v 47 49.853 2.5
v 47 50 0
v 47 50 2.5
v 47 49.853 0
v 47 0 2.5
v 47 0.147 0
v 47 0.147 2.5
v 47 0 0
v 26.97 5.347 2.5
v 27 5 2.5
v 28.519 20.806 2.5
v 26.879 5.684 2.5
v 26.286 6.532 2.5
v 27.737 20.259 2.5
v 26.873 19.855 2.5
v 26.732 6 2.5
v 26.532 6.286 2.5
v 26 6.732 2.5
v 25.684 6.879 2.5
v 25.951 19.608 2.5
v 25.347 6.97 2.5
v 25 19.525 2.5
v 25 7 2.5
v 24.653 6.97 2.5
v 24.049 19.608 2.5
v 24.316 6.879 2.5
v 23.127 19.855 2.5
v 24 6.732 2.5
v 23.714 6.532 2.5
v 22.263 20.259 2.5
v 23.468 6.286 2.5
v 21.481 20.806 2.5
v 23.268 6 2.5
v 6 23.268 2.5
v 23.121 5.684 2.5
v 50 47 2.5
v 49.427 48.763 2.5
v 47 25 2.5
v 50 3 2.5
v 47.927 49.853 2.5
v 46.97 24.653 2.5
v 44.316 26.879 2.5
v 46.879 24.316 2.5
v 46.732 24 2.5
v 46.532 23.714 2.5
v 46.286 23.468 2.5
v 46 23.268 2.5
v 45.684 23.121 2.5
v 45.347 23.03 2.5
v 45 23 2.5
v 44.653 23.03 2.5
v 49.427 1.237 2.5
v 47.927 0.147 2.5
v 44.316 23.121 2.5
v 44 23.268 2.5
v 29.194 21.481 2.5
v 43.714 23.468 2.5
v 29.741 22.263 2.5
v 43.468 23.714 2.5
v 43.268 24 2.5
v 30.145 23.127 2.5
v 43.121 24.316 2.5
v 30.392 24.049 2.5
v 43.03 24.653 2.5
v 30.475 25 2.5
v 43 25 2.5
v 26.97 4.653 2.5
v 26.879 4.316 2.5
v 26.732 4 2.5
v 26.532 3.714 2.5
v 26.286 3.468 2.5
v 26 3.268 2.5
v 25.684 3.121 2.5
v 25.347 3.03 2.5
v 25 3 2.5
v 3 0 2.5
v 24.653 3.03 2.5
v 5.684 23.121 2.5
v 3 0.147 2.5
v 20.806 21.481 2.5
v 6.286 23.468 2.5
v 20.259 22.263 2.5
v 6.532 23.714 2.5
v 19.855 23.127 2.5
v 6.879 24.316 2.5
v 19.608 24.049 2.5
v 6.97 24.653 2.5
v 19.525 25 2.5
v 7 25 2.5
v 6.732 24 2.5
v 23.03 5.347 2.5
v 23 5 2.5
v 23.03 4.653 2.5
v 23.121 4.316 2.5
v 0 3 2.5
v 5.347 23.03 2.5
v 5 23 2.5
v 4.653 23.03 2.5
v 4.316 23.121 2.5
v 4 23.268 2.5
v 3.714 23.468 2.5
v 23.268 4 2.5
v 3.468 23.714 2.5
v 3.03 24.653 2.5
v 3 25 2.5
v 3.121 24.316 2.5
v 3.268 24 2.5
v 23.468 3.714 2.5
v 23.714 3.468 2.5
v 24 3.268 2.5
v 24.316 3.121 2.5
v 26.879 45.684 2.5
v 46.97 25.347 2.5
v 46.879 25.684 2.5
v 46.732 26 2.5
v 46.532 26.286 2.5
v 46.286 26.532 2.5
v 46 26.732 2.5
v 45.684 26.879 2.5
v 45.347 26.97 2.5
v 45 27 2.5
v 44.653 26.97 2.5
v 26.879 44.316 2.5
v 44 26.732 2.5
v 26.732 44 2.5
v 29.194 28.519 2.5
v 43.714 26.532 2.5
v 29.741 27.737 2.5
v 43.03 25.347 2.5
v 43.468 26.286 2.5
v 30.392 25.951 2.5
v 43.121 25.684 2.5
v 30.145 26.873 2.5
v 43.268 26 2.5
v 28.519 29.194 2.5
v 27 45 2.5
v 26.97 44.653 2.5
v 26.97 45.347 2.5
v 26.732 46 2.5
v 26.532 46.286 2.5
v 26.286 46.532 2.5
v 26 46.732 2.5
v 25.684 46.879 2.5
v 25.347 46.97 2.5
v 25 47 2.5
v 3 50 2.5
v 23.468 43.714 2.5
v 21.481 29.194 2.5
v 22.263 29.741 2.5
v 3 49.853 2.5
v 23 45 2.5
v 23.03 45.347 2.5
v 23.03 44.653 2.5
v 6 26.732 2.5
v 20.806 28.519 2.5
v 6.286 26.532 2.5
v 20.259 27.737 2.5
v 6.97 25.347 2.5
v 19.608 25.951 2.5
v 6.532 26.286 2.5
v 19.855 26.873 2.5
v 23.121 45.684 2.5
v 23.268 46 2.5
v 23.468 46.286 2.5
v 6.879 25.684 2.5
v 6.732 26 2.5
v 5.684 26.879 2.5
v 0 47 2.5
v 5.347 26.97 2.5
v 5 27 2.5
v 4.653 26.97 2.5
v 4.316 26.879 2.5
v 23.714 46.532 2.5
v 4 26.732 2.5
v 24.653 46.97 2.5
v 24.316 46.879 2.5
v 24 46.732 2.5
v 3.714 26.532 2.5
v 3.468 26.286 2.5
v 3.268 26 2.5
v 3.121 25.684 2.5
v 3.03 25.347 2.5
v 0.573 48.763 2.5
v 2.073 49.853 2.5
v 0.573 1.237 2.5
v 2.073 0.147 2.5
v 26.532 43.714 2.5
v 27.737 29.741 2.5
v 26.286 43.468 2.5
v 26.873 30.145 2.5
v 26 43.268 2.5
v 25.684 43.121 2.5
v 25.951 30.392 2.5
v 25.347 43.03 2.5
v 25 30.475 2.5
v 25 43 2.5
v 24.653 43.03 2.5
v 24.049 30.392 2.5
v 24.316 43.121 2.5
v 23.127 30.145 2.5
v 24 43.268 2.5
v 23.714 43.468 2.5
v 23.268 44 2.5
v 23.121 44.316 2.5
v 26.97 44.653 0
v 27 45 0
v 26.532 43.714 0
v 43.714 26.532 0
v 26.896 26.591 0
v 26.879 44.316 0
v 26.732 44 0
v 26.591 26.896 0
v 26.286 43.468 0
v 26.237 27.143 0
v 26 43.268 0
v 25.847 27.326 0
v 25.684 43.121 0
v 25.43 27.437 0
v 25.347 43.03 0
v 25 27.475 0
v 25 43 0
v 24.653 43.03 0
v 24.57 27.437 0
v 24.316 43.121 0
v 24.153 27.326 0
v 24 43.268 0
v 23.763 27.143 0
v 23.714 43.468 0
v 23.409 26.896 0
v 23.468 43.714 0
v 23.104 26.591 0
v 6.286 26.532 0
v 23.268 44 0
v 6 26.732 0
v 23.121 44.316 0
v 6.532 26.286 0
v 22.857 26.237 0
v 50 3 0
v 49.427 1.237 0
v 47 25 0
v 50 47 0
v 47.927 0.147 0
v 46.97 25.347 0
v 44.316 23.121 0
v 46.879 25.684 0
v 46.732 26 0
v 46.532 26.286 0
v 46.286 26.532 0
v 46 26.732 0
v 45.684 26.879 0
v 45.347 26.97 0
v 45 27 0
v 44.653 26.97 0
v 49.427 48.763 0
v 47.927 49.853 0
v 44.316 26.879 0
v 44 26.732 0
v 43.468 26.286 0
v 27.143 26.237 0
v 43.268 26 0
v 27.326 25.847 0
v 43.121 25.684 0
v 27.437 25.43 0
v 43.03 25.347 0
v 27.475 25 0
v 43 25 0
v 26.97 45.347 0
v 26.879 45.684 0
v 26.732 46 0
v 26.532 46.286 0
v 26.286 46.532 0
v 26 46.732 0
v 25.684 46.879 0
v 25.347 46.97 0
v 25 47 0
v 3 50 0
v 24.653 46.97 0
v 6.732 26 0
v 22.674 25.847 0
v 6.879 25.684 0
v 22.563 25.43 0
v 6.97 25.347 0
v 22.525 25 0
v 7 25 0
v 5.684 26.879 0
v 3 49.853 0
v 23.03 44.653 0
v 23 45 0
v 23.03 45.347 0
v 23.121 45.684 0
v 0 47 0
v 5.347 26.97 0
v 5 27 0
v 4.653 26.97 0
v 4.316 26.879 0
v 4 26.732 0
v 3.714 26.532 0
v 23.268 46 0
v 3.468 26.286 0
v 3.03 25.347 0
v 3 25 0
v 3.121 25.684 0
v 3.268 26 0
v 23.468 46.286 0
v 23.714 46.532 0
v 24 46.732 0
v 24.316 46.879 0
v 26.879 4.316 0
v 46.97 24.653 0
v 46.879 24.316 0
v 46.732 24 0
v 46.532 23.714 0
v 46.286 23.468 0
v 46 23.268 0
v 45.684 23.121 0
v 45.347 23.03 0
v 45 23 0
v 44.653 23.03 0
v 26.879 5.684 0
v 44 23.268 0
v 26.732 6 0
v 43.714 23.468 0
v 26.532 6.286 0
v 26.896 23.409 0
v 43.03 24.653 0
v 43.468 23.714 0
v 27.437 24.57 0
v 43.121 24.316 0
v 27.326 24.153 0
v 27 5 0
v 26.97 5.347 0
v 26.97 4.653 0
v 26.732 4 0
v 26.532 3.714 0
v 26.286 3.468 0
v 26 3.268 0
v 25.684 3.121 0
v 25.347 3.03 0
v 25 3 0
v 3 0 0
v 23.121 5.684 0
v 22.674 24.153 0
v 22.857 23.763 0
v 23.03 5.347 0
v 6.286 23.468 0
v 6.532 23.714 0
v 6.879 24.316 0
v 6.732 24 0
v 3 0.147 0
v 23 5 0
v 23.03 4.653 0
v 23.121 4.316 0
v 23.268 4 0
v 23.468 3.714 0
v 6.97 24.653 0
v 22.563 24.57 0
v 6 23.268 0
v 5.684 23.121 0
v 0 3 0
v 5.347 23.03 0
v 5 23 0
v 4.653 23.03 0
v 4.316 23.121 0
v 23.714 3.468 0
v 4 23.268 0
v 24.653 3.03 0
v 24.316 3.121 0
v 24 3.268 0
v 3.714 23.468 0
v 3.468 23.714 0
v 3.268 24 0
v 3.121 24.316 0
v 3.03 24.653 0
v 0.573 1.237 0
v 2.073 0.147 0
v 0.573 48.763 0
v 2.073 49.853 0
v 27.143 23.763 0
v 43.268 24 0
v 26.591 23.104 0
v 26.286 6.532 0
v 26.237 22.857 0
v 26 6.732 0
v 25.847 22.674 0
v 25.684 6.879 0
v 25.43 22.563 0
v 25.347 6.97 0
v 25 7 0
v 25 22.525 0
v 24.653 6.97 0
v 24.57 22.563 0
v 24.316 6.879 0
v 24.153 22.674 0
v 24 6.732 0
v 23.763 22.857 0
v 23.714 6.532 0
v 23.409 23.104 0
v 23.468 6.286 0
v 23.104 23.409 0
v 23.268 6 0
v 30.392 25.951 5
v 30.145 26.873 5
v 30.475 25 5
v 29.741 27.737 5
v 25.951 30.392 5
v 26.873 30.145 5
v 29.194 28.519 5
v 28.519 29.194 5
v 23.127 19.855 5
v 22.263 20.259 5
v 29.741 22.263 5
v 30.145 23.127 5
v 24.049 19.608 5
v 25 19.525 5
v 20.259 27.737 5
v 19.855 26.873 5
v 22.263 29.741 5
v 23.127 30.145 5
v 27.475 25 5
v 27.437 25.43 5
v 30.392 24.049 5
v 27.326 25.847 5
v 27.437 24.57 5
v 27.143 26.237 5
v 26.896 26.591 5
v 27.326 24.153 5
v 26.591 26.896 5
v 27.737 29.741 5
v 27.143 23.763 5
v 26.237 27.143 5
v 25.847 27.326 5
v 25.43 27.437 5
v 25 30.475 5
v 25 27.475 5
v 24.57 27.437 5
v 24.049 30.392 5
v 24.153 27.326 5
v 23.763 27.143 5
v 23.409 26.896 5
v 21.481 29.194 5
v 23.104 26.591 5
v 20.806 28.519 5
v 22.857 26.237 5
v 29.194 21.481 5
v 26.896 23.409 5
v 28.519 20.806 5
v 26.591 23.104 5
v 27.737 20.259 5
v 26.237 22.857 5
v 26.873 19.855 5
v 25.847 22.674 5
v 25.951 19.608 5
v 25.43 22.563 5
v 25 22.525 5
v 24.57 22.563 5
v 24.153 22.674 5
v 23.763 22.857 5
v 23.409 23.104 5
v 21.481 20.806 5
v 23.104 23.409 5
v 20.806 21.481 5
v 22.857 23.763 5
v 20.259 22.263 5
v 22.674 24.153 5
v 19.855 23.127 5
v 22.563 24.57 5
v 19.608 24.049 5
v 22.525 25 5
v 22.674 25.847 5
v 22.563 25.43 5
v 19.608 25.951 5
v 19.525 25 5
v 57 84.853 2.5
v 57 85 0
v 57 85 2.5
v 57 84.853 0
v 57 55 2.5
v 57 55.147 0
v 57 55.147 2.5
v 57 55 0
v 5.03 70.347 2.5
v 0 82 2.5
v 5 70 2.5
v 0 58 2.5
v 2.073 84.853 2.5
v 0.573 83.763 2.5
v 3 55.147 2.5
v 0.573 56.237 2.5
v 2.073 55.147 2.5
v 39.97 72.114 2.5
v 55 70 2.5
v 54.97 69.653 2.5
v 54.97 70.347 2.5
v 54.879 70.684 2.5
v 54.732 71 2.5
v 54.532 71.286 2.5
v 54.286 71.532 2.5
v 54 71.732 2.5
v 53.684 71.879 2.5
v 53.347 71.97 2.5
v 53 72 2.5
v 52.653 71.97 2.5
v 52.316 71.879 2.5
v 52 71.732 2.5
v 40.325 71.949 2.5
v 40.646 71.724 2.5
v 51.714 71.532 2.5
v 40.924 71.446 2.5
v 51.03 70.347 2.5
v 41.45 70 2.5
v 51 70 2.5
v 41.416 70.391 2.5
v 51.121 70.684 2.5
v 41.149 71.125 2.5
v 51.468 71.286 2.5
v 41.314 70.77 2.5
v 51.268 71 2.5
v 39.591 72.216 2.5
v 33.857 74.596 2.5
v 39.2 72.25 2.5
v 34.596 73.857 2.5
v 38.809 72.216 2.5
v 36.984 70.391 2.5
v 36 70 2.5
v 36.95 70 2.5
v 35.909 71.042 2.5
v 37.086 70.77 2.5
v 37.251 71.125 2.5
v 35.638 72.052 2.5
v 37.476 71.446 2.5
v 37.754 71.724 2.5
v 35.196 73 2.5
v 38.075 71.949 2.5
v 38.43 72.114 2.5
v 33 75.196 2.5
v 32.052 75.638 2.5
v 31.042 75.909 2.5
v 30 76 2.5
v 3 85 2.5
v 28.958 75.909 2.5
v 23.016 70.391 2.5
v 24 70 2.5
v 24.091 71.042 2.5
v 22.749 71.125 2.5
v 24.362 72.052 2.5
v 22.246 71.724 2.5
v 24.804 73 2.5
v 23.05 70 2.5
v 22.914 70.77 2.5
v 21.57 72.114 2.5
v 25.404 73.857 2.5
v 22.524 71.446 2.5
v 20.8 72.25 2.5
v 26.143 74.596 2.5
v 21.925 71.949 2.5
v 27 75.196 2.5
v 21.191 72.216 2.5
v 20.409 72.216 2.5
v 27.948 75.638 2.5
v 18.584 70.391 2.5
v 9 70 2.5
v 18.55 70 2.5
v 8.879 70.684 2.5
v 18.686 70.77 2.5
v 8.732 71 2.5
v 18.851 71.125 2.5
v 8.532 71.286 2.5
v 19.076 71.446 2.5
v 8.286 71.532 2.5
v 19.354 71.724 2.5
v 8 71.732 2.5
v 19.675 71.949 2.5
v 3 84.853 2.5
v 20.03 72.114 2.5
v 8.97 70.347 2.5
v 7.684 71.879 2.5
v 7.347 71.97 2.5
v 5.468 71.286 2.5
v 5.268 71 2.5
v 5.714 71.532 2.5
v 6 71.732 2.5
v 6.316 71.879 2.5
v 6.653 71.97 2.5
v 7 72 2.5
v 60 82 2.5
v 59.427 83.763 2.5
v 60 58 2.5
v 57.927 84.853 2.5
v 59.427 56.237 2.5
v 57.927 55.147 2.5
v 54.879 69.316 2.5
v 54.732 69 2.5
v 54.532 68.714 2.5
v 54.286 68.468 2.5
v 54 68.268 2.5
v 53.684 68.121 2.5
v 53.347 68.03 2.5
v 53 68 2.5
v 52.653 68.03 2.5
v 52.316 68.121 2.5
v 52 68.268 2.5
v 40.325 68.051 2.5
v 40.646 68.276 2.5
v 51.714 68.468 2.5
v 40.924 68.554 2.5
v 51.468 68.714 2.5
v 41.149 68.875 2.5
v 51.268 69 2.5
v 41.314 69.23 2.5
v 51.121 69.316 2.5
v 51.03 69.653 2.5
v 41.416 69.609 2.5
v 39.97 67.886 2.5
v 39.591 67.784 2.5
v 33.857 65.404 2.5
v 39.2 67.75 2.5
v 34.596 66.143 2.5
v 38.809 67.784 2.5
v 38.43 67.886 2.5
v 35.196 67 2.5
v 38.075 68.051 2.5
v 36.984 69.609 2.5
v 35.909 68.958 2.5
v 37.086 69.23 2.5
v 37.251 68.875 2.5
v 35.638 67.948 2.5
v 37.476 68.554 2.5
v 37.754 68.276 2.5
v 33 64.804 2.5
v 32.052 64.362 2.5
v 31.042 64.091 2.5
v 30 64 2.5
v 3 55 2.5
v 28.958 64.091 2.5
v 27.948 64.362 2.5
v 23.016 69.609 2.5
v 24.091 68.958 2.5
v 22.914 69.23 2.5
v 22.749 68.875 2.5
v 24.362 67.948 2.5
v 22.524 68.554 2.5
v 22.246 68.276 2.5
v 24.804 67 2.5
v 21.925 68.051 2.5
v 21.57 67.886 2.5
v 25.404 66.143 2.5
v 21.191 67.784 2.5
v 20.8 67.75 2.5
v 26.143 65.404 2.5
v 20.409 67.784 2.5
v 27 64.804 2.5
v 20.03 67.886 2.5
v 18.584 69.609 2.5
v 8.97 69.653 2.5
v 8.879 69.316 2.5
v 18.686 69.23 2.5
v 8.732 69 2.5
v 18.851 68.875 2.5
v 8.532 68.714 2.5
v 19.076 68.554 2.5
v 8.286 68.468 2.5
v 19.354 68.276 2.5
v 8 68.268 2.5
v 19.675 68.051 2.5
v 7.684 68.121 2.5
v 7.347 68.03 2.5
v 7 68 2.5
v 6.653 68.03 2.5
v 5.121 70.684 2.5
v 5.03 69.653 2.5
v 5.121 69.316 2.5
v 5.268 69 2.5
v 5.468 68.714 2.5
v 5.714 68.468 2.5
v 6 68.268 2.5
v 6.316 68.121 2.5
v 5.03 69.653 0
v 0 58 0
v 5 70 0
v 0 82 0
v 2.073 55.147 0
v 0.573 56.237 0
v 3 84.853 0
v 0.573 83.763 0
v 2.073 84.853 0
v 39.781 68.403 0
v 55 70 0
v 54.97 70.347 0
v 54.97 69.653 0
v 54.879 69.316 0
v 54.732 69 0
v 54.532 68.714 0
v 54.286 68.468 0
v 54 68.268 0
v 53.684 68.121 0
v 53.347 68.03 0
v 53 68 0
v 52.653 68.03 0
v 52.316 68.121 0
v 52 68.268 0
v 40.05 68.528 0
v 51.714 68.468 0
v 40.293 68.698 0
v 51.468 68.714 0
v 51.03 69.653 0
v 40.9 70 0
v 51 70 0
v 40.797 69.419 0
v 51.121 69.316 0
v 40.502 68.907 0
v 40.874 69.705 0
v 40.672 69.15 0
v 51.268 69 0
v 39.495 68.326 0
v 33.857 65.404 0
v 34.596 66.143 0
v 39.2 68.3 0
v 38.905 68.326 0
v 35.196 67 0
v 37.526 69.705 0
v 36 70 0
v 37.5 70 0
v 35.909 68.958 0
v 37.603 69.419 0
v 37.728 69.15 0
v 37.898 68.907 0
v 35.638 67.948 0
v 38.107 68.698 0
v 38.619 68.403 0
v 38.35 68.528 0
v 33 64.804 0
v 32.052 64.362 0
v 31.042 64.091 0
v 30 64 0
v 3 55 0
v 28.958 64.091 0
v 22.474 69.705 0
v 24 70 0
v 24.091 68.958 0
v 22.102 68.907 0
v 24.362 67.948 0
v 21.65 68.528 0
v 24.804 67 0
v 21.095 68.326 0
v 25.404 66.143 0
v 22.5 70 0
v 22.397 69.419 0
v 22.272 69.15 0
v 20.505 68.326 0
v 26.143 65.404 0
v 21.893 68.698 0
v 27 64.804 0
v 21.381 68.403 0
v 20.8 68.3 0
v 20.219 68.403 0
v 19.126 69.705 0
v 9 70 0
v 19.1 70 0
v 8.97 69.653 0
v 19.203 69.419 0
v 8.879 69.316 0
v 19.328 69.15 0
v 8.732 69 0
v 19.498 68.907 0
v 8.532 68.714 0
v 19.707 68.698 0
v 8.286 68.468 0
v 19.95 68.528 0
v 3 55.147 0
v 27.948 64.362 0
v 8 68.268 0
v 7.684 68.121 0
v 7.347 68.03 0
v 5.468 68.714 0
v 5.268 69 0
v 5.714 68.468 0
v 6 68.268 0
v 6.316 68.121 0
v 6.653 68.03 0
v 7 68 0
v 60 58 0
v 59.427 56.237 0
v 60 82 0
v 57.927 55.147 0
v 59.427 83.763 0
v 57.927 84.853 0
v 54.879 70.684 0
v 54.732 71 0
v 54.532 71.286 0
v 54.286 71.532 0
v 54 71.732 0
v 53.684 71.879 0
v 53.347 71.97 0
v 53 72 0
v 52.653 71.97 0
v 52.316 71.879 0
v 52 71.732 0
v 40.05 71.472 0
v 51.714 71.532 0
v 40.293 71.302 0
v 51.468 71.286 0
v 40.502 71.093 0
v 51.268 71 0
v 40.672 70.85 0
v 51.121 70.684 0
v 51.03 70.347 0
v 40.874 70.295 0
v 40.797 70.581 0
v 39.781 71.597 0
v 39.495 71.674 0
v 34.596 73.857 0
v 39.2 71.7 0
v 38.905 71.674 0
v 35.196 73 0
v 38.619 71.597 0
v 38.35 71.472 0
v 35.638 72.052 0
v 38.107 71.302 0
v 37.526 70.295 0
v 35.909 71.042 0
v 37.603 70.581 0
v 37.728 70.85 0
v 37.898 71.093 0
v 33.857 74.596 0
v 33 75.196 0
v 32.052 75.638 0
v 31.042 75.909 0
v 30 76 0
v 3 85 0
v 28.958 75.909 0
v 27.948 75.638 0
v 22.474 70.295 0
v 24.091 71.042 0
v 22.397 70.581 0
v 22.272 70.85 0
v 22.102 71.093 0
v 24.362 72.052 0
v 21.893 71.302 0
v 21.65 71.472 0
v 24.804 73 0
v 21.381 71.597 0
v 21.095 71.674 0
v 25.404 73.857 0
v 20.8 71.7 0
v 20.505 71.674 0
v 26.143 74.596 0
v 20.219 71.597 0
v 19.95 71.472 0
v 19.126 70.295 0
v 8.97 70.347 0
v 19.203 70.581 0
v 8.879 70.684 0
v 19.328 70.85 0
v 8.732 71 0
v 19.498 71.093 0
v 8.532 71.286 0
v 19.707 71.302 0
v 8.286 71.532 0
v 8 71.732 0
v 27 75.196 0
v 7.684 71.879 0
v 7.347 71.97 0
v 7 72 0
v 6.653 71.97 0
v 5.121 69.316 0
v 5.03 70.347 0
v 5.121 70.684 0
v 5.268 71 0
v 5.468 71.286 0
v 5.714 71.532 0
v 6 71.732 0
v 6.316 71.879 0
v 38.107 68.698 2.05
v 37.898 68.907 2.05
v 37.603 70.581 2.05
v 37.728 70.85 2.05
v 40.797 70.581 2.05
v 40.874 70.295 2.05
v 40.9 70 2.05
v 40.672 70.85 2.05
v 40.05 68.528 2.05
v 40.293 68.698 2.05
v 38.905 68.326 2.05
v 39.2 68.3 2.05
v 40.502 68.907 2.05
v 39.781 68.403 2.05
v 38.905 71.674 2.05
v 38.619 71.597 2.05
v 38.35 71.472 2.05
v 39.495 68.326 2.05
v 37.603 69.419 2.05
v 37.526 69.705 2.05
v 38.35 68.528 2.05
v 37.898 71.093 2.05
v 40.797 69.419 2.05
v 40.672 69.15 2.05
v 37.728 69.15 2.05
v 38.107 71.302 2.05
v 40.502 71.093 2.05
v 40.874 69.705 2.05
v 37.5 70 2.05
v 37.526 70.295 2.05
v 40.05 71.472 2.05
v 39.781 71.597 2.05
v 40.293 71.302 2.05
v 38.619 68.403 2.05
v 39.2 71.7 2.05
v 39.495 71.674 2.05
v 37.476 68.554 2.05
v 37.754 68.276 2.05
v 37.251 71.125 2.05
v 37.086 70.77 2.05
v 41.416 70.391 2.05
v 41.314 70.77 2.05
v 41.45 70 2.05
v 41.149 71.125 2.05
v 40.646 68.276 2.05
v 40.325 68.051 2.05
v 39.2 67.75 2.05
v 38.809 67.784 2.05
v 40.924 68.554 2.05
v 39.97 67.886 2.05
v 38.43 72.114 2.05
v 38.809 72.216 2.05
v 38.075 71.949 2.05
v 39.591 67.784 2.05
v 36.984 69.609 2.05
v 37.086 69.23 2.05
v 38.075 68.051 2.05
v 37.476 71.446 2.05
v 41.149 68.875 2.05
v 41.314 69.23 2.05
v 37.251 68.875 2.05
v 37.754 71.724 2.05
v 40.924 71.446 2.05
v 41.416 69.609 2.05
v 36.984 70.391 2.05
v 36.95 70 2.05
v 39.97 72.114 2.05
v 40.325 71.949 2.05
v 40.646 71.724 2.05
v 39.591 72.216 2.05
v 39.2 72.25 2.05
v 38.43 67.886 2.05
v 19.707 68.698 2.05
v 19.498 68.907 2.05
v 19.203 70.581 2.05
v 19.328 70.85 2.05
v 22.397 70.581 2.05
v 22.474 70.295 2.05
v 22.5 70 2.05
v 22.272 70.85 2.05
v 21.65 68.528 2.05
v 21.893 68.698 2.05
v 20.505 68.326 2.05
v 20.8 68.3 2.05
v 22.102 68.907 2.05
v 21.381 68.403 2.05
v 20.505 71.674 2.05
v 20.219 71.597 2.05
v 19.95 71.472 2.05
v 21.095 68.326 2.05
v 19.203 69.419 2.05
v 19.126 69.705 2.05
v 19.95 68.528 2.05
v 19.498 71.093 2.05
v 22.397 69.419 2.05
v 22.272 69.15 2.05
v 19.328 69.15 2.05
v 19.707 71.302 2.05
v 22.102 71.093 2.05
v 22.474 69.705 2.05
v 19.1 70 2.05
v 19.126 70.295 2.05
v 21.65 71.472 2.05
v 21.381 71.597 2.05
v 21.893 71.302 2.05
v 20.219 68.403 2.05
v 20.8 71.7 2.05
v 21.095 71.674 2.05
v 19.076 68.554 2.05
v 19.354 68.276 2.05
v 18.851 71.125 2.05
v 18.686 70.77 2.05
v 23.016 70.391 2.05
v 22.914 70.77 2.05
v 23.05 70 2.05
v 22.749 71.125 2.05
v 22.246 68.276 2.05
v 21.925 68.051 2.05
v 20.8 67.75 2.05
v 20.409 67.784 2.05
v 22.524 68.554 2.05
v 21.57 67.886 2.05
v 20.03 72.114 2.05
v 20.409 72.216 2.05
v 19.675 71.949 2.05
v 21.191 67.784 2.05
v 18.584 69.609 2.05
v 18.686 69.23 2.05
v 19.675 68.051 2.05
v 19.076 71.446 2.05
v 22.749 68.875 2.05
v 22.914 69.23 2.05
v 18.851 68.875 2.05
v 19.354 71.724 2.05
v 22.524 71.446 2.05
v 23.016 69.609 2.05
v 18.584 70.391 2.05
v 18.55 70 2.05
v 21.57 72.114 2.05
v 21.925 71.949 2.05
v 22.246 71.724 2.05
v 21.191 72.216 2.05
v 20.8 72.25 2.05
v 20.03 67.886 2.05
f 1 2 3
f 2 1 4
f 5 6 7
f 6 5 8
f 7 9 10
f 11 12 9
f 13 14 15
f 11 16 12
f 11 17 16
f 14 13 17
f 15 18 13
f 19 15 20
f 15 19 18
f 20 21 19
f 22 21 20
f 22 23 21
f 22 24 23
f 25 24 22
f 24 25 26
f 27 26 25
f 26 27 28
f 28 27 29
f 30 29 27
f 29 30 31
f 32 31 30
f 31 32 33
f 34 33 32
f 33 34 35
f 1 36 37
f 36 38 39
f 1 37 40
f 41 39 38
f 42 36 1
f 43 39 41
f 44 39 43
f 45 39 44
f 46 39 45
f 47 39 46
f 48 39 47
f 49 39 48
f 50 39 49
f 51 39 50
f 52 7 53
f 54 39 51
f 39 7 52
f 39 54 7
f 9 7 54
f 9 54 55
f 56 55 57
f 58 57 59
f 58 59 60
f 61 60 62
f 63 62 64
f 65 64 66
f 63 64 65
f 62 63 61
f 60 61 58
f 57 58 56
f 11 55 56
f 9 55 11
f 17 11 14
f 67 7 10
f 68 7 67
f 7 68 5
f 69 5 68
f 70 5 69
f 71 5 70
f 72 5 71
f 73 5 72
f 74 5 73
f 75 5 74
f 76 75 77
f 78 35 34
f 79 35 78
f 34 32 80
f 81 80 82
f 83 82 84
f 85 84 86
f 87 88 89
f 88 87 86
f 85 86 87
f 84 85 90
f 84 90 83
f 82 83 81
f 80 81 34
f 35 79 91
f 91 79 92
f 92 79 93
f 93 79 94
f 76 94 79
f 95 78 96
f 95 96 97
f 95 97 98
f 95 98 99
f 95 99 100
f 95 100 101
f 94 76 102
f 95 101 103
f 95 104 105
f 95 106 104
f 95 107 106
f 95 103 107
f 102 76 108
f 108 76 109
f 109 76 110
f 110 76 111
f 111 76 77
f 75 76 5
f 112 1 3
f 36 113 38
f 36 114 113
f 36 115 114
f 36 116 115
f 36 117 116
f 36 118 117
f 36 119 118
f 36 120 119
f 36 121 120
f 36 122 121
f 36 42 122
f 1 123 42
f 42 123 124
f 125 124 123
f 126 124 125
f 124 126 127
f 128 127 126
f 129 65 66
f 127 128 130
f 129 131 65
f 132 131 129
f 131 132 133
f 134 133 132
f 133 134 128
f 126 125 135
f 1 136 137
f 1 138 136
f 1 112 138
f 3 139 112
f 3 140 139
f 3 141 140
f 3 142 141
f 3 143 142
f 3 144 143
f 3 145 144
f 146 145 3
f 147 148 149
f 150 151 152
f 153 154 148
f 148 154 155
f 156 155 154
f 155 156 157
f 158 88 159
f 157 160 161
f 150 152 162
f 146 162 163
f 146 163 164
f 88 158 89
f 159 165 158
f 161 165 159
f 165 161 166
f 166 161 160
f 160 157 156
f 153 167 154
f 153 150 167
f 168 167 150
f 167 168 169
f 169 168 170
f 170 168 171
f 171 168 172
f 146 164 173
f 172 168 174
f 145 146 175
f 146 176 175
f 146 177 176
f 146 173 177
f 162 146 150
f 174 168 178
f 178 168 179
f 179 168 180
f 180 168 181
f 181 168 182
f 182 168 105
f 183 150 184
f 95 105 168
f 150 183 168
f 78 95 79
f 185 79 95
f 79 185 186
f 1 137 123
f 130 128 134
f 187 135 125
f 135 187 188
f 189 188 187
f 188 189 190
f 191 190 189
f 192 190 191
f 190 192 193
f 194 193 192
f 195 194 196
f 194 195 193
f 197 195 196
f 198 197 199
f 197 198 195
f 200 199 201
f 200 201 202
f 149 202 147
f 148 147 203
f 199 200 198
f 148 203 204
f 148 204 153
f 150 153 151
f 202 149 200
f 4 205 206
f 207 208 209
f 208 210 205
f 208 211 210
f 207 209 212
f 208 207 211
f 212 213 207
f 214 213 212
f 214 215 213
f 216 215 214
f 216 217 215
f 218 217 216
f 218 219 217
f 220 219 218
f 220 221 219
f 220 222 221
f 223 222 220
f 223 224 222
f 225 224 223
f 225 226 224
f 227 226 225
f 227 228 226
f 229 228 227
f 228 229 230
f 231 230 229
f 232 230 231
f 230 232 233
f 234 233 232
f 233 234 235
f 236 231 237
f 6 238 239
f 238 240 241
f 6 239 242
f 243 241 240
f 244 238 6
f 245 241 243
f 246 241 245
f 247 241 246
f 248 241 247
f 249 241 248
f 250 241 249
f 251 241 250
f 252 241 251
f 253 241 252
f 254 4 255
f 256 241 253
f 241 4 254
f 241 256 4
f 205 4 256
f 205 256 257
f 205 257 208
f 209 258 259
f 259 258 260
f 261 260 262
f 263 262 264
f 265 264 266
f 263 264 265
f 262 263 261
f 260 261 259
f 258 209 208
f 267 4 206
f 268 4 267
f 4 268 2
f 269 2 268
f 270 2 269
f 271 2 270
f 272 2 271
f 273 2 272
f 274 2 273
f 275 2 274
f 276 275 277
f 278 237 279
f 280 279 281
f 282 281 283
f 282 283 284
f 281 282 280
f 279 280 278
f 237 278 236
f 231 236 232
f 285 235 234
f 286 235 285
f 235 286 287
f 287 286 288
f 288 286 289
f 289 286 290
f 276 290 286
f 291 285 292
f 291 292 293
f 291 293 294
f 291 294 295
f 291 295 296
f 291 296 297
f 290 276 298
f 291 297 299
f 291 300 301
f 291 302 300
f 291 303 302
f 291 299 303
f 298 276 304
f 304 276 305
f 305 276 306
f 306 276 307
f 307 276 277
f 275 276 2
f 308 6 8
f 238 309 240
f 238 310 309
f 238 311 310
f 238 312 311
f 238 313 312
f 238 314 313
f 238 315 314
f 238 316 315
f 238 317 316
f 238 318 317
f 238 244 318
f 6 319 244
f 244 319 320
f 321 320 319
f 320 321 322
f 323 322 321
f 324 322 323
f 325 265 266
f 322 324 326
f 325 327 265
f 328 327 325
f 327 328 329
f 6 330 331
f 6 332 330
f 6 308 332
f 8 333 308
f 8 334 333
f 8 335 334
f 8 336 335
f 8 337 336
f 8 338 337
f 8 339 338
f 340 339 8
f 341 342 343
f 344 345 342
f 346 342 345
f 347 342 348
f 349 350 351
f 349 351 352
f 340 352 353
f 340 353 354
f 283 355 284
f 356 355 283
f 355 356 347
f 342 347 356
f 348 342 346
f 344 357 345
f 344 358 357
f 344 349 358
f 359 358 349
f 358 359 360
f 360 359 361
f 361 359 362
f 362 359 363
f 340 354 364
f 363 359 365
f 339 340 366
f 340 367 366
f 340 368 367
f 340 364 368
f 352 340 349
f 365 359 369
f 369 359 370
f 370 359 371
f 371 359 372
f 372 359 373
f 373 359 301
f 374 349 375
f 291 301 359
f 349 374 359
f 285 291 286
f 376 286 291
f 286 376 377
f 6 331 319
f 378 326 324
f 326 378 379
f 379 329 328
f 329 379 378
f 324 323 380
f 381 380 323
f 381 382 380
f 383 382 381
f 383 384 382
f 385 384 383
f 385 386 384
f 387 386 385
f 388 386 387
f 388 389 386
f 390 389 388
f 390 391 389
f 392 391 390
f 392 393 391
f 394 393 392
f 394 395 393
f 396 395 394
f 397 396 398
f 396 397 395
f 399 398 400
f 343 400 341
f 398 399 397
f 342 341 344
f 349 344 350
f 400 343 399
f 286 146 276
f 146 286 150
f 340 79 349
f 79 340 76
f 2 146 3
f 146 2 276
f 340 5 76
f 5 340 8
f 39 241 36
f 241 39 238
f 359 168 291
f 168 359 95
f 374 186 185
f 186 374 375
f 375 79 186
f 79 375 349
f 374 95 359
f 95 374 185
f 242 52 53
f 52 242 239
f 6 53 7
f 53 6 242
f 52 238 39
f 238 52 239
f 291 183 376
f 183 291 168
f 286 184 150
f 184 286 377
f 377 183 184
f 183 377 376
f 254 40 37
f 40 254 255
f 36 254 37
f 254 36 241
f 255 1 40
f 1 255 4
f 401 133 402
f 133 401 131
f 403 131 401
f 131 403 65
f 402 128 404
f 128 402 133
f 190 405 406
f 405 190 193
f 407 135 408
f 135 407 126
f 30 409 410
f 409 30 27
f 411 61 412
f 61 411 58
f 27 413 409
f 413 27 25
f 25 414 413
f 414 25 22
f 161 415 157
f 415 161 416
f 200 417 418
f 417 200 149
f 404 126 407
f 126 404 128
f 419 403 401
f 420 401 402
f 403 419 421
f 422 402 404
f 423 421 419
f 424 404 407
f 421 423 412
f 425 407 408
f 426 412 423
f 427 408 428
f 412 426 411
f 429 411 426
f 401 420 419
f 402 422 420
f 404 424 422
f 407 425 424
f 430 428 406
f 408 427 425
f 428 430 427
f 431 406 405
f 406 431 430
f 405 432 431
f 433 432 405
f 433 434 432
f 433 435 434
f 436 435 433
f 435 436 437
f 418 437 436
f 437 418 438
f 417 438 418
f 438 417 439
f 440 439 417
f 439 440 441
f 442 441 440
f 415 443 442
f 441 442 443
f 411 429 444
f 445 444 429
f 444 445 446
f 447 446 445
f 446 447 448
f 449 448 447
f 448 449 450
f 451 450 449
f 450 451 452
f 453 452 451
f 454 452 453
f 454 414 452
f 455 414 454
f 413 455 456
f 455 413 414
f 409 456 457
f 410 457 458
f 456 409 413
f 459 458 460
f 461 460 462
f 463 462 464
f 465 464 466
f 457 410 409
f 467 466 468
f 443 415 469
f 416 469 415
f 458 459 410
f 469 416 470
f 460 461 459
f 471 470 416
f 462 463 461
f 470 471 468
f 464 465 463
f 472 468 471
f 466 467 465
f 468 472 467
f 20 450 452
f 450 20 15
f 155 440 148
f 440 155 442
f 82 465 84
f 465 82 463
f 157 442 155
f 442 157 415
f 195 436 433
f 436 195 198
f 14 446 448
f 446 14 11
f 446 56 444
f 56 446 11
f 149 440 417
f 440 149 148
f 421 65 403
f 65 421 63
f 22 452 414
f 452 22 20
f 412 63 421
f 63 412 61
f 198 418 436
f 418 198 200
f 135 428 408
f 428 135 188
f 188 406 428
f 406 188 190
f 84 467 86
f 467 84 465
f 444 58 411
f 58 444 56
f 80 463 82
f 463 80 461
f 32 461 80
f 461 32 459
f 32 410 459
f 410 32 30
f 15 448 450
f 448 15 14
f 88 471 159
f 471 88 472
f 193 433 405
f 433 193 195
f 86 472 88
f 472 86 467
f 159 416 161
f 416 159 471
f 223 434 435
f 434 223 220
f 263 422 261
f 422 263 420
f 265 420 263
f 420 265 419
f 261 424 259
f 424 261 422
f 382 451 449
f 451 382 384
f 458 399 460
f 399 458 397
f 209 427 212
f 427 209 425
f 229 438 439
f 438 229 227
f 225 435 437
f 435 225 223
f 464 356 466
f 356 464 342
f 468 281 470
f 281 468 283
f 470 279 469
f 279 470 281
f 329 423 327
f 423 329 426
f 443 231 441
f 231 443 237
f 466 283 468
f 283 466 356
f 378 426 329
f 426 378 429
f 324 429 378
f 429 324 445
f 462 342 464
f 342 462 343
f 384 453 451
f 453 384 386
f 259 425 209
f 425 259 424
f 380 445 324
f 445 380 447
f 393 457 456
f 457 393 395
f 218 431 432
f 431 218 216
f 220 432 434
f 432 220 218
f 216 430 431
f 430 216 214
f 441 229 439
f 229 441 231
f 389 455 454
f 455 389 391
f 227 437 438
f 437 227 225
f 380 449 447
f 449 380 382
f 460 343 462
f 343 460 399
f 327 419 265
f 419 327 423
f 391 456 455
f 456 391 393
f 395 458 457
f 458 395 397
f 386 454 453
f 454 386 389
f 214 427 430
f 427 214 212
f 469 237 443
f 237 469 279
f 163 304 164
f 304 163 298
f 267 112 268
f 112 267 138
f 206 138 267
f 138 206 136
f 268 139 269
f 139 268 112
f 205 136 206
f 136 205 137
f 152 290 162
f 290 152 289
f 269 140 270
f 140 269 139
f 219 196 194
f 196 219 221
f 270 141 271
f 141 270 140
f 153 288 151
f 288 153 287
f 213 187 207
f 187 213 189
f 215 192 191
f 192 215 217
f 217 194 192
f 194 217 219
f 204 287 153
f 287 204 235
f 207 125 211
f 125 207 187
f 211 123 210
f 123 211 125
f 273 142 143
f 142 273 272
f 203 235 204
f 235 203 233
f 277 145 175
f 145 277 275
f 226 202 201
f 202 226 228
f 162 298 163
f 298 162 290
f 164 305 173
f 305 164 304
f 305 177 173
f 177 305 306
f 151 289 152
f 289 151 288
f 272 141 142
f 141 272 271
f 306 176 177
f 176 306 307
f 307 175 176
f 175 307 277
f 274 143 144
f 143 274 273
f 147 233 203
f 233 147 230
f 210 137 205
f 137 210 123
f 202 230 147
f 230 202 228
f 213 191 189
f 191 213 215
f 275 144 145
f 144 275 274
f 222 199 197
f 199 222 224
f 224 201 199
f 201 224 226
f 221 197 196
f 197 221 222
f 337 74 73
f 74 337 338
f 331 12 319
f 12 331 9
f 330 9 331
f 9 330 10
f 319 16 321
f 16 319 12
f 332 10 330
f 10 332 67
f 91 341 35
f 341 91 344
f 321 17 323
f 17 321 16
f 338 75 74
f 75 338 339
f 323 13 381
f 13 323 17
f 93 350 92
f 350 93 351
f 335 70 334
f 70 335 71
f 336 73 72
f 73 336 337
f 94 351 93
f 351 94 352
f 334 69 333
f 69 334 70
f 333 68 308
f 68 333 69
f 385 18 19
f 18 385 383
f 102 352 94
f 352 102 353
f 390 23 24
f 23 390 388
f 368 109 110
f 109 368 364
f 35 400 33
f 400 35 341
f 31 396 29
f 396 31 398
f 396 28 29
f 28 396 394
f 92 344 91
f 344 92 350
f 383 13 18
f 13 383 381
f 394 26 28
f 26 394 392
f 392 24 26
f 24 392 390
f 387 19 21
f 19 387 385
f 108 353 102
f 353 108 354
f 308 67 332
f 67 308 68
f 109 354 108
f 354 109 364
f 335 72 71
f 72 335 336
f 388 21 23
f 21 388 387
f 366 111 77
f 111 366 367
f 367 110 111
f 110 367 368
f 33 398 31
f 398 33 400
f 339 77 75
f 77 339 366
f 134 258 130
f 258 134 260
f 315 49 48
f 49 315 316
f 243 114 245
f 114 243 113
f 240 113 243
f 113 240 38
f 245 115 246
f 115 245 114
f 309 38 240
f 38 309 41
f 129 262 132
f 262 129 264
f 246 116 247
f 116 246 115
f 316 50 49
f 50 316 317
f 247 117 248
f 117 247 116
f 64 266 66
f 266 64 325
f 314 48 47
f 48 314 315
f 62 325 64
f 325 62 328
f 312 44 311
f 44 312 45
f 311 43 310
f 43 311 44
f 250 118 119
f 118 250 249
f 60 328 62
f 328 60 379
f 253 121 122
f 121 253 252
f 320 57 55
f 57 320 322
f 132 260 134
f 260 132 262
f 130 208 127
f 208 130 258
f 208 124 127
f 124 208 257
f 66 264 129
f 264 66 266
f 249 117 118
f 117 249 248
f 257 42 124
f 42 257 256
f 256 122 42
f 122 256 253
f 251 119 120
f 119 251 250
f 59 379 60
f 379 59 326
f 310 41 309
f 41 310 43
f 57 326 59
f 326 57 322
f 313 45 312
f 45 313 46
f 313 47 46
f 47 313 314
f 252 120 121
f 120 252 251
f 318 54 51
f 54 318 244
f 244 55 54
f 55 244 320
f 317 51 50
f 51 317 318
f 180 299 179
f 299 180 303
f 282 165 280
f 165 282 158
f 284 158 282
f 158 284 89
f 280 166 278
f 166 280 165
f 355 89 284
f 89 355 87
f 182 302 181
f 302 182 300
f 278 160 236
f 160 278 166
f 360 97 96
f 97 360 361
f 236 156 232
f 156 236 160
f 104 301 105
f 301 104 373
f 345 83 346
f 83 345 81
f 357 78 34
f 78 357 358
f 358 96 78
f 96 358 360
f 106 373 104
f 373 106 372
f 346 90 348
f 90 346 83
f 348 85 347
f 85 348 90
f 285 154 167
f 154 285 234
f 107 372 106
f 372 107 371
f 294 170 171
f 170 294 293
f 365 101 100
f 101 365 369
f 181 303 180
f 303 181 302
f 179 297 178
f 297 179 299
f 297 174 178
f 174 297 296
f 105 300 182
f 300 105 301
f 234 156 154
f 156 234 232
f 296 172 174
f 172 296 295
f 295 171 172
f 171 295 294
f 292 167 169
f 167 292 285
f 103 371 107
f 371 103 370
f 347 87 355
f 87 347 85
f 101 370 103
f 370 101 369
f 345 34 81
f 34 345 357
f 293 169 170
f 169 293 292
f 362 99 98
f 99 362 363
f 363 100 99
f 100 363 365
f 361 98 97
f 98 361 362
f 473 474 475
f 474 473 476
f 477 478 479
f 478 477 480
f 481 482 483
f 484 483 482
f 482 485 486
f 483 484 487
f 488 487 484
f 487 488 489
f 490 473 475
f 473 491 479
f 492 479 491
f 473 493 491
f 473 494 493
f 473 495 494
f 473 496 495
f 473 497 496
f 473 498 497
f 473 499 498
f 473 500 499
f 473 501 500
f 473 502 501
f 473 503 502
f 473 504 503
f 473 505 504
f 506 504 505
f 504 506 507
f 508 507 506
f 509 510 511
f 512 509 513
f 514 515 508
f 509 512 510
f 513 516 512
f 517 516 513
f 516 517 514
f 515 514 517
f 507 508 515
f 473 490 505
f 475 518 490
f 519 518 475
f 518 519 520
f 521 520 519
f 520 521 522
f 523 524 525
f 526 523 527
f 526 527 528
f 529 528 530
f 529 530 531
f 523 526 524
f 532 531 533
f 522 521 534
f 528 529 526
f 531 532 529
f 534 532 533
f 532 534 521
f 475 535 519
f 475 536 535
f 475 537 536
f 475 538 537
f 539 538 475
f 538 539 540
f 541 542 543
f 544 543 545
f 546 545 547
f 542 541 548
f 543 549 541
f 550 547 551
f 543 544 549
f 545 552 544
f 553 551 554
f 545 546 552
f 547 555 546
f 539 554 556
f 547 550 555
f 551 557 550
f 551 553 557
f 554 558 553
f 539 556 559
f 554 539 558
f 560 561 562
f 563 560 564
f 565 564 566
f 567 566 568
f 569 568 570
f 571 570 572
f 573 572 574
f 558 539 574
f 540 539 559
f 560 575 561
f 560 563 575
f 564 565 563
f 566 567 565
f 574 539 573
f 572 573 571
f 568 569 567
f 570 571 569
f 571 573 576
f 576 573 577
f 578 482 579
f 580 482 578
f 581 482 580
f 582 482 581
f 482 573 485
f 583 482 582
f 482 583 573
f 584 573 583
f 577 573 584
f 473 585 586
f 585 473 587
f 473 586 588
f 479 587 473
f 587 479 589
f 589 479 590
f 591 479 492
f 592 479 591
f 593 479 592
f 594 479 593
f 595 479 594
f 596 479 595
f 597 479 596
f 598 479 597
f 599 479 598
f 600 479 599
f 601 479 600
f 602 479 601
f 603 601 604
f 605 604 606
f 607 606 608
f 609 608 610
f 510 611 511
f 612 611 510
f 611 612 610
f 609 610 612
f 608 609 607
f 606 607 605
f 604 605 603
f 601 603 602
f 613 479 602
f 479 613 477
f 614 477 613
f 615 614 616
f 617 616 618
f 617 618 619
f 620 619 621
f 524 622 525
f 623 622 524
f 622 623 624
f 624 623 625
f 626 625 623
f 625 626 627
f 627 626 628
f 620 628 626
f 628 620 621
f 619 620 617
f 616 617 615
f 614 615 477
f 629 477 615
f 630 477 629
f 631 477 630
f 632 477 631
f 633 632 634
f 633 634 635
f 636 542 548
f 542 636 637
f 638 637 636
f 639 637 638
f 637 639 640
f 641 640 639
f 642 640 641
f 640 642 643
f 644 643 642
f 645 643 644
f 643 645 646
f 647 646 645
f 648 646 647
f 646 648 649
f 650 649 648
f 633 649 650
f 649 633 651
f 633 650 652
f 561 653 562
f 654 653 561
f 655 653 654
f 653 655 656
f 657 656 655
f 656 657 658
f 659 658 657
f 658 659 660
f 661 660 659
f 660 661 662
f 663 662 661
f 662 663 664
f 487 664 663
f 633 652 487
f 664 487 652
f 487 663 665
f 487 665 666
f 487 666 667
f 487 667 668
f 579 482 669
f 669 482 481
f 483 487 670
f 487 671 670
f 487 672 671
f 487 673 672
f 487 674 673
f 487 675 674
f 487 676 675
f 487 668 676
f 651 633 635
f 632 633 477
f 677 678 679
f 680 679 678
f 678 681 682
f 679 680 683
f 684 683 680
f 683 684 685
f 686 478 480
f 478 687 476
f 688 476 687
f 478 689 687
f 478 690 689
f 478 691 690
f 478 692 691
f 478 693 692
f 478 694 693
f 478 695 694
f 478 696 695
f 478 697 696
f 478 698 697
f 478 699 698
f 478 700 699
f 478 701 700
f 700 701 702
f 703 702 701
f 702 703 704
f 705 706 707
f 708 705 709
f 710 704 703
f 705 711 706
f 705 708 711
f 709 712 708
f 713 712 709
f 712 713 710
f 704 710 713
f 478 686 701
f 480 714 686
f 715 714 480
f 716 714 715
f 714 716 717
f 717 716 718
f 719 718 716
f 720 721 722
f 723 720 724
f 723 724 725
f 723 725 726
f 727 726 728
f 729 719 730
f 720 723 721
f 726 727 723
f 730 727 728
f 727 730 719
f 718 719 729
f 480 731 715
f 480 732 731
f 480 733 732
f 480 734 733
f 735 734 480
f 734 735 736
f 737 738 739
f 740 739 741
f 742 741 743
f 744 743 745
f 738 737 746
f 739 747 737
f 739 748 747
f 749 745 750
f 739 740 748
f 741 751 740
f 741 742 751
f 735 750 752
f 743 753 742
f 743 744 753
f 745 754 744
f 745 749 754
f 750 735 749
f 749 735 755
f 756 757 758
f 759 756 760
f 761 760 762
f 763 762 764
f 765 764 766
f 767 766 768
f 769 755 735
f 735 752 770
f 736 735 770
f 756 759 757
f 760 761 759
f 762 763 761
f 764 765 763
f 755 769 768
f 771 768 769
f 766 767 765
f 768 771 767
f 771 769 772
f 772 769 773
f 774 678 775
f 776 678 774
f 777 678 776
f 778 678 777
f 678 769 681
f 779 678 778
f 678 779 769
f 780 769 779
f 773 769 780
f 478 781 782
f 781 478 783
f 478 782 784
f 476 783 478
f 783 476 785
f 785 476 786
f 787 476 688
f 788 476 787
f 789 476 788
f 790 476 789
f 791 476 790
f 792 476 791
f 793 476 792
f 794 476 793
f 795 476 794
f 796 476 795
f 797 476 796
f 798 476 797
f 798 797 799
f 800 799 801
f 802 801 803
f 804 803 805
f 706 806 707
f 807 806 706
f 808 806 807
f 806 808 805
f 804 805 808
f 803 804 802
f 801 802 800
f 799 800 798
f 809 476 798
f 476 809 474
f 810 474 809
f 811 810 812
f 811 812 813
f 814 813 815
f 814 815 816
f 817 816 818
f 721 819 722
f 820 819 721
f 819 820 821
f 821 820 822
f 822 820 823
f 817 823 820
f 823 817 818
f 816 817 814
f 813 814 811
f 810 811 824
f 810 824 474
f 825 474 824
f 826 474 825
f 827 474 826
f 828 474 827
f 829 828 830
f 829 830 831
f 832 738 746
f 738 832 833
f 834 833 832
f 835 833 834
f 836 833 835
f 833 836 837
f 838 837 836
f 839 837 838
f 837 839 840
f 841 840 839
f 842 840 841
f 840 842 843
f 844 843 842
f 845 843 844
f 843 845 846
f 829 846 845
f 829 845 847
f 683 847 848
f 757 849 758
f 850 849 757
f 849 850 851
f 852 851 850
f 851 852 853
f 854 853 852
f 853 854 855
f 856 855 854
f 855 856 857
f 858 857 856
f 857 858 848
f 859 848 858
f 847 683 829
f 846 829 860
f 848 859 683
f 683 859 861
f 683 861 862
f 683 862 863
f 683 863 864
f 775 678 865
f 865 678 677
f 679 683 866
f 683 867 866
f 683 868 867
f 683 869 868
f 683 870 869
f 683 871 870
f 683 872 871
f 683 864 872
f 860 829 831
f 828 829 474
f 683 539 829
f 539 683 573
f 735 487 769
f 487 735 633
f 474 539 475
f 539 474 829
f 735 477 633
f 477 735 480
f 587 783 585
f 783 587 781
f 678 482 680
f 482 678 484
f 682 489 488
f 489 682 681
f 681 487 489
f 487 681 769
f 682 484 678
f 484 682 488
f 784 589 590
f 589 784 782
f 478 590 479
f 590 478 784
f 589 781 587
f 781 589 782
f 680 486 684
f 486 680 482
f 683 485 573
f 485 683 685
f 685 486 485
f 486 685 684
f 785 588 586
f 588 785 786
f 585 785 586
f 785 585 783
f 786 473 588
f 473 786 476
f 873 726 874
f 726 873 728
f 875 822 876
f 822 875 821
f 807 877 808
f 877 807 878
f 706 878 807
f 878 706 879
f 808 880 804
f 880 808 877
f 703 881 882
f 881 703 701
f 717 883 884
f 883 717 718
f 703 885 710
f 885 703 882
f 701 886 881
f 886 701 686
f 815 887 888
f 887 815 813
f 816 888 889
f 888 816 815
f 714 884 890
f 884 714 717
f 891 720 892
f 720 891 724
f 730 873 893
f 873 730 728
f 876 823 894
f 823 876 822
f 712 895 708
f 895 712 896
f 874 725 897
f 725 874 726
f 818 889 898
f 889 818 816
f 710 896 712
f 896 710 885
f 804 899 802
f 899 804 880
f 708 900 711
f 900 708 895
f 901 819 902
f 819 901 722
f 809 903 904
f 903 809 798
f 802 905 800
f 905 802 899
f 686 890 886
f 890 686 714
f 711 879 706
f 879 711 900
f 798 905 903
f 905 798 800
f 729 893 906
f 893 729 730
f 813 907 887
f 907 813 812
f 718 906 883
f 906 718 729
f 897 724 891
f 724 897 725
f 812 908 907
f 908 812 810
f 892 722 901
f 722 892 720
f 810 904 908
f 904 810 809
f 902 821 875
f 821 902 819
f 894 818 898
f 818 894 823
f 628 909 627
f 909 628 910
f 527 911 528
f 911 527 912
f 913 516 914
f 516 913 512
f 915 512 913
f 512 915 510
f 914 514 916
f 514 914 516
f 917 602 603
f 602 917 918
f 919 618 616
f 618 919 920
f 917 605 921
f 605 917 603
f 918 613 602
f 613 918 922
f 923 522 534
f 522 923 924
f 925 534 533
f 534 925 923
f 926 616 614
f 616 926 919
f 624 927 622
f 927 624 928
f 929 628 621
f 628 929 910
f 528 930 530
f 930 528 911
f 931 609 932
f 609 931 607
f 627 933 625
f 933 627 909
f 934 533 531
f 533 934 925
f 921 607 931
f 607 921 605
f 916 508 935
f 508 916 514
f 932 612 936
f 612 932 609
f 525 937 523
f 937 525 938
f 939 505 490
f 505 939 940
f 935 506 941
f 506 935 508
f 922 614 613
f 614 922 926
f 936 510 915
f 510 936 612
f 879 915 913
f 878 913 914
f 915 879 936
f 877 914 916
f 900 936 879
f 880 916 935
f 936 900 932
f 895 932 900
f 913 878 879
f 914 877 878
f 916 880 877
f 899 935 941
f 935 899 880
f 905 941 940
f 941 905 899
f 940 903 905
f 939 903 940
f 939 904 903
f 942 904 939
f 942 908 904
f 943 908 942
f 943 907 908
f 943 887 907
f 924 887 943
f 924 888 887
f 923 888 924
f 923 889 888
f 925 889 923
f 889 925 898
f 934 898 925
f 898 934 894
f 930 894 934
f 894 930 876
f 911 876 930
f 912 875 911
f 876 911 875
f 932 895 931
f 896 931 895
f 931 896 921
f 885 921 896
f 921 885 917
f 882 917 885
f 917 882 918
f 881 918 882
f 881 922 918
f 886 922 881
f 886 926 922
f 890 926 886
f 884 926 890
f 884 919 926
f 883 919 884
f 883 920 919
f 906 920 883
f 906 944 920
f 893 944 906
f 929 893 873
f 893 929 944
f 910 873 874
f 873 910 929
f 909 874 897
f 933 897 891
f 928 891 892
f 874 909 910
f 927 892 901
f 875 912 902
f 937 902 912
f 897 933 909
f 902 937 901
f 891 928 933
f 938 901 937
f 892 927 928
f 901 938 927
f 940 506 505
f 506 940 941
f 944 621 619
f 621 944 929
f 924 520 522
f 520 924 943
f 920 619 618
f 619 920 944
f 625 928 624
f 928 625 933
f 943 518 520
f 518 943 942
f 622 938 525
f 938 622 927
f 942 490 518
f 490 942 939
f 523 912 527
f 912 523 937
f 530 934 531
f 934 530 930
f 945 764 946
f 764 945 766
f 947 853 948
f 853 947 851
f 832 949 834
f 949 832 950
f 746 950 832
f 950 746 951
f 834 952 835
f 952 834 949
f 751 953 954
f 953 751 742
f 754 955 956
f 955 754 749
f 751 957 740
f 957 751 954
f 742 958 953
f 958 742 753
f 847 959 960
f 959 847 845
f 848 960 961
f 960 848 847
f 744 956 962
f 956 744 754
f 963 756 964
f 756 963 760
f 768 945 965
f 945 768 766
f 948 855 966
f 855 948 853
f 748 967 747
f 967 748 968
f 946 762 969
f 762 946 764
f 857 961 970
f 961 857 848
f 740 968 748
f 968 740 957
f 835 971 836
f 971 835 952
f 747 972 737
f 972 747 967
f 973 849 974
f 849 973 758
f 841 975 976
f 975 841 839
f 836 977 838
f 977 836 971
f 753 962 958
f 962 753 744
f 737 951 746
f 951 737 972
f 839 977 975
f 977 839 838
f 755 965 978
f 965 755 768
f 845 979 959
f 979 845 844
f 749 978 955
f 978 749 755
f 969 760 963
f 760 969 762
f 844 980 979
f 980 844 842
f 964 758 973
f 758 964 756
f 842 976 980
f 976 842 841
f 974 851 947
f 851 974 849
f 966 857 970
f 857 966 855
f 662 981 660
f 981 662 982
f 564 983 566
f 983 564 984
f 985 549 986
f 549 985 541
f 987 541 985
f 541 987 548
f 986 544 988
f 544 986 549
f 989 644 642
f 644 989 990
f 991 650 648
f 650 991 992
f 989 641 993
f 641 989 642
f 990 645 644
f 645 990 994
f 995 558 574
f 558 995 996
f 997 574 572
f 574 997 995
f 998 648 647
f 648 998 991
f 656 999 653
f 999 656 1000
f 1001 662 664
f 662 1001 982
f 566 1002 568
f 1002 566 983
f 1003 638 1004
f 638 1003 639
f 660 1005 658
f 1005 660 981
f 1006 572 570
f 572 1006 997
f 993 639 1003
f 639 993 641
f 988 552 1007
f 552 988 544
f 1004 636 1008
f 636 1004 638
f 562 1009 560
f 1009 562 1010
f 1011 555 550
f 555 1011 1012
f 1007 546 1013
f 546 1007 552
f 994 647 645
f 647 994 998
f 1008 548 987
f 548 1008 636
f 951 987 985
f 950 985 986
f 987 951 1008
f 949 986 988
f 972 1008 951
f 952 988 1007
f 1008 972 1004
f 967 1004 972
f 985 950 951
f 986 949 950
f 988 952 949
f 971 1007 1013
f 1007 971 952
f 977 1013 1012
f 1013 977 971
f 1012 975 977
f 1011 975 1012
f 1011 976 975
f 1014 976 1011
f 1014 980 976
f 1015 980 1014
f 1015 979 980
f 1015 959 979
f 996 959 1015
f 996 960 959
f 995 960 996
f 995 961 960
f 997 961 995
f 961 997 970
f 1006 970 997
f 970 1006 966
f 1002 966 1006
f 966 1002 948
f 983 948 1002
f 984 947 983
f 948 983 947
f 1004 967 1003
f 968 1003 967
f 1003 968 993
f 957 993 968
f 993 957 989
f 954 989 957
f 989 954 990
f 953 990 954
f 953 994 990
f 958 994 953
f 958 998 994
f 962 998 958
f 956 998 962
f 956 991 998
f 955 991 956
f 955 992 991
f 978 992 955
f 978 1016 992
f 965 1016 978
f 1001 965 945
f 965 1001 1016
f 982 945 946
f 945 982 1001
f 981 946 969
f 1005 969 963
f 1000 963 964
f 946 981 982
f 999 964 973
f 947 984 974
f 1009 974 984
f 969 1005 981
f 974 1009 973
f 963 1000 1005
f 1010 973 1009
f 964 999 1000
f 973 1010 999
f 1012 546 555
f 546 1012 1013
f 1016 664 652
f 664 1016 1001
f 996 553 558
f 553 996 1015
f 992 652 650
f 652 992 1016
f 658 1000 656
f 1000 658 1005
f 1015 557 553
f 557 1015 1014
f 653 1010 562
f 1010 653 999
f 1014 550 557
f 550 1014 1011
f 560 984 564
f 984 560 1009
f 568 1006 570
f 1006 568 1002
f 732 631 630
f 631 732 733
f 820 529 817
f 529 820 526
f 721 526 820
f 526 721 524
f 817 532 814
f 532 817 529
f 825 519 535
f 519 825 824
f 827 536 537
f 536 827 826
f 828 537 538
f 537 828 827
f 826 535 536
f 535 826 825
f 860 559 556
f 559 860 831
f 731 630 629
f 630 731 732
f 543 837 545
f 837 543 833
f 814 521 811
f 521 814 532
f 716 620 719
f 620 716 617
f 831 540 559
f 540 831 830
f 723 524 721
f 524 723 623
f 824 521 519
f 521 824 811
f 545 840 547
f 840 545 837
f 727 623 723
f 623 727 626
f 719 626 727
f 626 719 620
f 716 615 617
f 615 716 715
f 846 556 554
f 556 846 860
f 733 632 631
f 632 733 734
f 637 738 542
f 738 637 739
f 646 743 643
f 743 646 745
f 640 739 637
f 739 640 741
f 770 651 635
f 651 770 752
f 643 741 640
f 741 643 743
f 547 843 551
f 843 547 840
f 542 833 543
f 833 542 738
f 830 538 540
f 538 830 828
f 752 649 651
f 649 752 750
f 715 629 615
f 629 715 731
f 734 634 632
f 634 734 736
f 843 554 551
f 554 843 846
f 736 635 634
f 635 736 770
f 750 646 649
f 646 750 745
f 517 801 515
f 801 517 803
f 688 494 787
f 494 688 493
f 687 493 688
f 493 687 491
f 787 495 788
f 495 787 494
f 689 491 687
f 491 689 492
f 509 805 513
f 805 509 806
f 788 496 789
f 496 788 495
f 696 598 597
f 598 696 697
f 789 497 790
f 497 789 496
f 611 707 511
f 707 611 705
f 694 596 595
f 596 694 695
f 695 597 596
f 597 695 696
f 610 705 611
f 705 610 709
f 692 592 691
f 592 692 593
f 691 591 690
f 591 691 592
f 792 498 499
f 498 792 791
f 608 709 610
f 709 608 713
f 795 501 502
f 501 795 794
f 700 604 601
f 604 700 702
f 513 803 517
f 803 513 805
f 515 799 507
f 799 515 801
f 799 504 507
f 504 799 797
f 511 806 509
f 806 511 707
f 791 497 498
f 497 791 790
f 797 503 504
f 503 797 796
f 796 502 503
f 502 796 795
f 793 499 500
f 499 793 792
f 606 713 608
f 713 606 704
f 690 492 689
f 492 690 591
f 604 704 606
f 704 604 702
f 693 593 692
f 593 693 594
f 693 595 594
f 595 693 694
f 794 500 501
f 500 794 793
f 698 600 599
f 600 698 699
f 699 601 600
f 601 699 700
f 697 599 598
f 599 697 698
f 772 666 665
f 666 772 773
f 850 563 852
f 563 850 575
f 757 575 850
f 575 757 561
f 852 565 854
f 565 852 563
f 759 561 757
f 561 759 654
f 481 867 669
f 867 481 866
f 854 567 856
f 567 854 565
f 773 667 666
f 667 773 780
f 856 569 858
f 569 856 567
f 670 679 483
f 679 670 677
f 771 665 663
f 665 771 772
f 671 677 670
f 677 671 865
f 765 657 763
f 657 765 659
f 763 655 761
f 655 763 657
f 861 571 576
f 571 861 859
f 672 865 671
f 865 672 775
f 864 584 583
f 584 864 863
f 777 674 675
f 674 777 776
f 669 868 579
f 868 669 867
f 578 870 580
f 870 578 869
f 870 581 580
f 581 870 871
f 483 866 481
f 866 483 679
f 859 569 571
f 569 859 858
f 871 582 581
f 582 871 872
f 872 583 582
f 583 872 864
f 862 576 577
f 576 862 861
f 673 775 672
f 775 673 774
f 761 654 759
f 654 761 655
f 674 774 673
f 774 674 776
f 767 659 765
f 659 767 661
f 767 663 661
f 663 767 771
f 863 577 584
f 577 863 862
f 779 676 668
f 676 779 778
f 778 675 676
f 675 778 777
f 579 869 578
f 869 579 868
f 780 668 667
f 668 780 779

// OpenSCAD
// Customizable Rotable Bowden Extruder 
// preview[view:south, tilt:top];

// Which one would you like to see?
part = "both"; // [top:Motor Base,bottom:Bearing Base,both:Motor and Bearing Base]



/* [Motor Base] */

//Motor base width 
motor_base_size_x = 60;

//Motor base length 
motor_base_size_y = 30;

//Motor base height 
motor_base_size_z = 2.5;

//
bearing_top_central_hole_diameter =  12;

//
bearing_top_screw_head_diameter = 4.5;

//
bearing_top_screw_hole_diameter = 3.4;

//
bearing_top_screw_height = 4.5;

//distant between bearing top screw hole and the central
bearing_top_screw_hole_position = 9.2;

//motor width
motor_width = 42;

//
motor_holder_diameter = 4;


/* [Bearing Base] */

//Hard Disk bearing base width (mm)
bearing_base_size_x = 50;

//Hard Disk bearing base length 
bearing_base_size_y = 50;

//Hard Disk bearing base height 
bearing_base_size_z = 2.5;

//Central hole diameter    
base_central_hole_diameter = 4.95;

//Base screw diameter 
base_screw_diameter = 4;

//The distant between the screw and the central
base_screw_position = 20;



/* [Hidden] */
bearing_top_screw_head_hole_height = motor_base_size_z -bearing_top_screw_height/2;



module rounded(size, r) {
    //2 cube + 4 cylinder
    union() {
        translate([r, 0, 0]) cube([size[0]-2*r, size[1], size[2]]);
        translate([0, r, 0]) cube([size[0], size[1]-2*r, size[2]]);
        translate([r, r, 0]) cylinder(h=size[2], r=r);
        translate([size[0]-r, r, 0]) cylinder(h=size[2], r=r);
        translate([r, size[1]-r, 0]) cylinder(h=size[2], r=r);
        translate([size[0]-r, size[1]-r, 0]) cylinder(h=size[2], r=r);
    }
}

//bearing base
module bearingBase() {
    difference() {
        union() {
            //bearing base
            rounded([bearing_base_size_x, bearing_base_size_y, bearing_base_size_z], 3);
            //bearing central
            translate ([bearing_base_size_x/2,bearing_base_size_y/2,0]) {
                cylinder(h=(bearing_base_size_z+2.5), d=(base_central_hole_diameter+6),center=false, $fn=36);
            }
        }
        //bearing central hole
        translate ([bearing_base_size_x/2,bearing_base_size_y/2,-0.2]) {
            cylinder(h=bearing_base_size_z+2.5+1, d=base_central_hole_diameter, center=false, $fn=36);
        }
    
        //screw hole up
        translate ([bearing_base_size_x/2,bearing_base_size_y/2+base_screw_position,-0.2]) {
            cylinder(h=bearing_base_size_z+1, d=base_screw_diameter, center=false, $fn=36);
        }
    
        //screw hole down
        translate ([bearing_base_size_x/2,bearing_base_size_y/2-base_screw_position,-0.2]) {
            cylinder(h=bearing_base_size_z+1, d=base_screw_diameter, center=false, $fn=36);
        }

        //screw hole right
        translate ([bearing_base_size_x/2+base_screw_position,bearing_base_size_y/2, -0.2]) {
            cylinder(h=bearing_base_size_z+1, d=base_screw_diameter, center=false, $fn=36);
        }
    
        //screw hole left
        translate ([bearing_base_size_x/2-base_screw_position,bearing_base_size_y/2, -0.2]) {
            cylinder(h=bearing_base_size_z+10+1, d=base_screw_diameter, center=false, $fn=36);
        }
    }
}


//motor base
module motorBase () {
    difference() {
        //base
        rounded([motor_base_size_x, motor_base_size_y, motor_base_size_z], 3);
        //bearing top central hole 
        translate ([motor_base_size_x/2,motor_base_size_y/2,-0.2]) {
            cylinder(h=motor_base_size_z+1, d=bearing_top_central_hole_diameter,center=false, $fn=36);
        }
        
        //bearing screw hole (right)
        translate ([motor_base_size_x/2+bearing_top_screw_hole_position,motor_base_size_y/2,-0.2]) {
            union () {
                cylinder(h=motor_base_size_z+1, d=bearing_top_screw_hole_diameter,center=false, $fn=36);
                translate ([0,0,bearing_top_screw_height/2]) {
                    cylinder(h=bearing_top_screw_head_hole_height+1, d=bearing_top_screw_head_diameter,center=false, $fn=36);
                }
            }
        }
        //bearing screw hole (left)
        translate ([motor_base_size_x/2-bearing_top_screw_hole_position,motor_base_size_y/2,-0.2]) {
            union () {
                cylinder(h=motor_base_size_z+1, d=bearing_top_screw_hole_diameter,center=false, $fn=36);
                translate ([0,0,bearing_top_screw_height/2]) {
                    cylinder(h=bearing_top_screw_head_hole_height+1, d=bearing_top_screw_head_diameter,center=false, $fn=36);
                }
            }
        }
        
        //motor holder hole (right)
        translate ([motor_base_size_x/2+motor_width/2+motor_holder_diameter/2,motor_base_size_y/2,-0.2]) {
        cylinder(h=motor_base_size_z+1, d=motor_holder_diameter,center=false, $fn=36);
        }
        //motor holder hole (left)
        translate ([motor_base_size_x/2-motor_width/2-motor_holder_diameter/2,motor_base_size_y/2,-0.2]) {
        cylinder(h=motor_base_size_z+1, d=motor_holder_diameter,center=false, $fn=36);
        }
    }

}

module both() {
    bearingBase();
    translate ([0,bearing_base_size_y+5, 0]) {
        motorBase();
    }
}

module print_part() {
	if (part == "top") {
		motorBase();
	} else if (part == "bottom") {
		bearingBase();
	} else if (part == "both") {
		both();
	} else {
		both();
	}
}

print_part();

